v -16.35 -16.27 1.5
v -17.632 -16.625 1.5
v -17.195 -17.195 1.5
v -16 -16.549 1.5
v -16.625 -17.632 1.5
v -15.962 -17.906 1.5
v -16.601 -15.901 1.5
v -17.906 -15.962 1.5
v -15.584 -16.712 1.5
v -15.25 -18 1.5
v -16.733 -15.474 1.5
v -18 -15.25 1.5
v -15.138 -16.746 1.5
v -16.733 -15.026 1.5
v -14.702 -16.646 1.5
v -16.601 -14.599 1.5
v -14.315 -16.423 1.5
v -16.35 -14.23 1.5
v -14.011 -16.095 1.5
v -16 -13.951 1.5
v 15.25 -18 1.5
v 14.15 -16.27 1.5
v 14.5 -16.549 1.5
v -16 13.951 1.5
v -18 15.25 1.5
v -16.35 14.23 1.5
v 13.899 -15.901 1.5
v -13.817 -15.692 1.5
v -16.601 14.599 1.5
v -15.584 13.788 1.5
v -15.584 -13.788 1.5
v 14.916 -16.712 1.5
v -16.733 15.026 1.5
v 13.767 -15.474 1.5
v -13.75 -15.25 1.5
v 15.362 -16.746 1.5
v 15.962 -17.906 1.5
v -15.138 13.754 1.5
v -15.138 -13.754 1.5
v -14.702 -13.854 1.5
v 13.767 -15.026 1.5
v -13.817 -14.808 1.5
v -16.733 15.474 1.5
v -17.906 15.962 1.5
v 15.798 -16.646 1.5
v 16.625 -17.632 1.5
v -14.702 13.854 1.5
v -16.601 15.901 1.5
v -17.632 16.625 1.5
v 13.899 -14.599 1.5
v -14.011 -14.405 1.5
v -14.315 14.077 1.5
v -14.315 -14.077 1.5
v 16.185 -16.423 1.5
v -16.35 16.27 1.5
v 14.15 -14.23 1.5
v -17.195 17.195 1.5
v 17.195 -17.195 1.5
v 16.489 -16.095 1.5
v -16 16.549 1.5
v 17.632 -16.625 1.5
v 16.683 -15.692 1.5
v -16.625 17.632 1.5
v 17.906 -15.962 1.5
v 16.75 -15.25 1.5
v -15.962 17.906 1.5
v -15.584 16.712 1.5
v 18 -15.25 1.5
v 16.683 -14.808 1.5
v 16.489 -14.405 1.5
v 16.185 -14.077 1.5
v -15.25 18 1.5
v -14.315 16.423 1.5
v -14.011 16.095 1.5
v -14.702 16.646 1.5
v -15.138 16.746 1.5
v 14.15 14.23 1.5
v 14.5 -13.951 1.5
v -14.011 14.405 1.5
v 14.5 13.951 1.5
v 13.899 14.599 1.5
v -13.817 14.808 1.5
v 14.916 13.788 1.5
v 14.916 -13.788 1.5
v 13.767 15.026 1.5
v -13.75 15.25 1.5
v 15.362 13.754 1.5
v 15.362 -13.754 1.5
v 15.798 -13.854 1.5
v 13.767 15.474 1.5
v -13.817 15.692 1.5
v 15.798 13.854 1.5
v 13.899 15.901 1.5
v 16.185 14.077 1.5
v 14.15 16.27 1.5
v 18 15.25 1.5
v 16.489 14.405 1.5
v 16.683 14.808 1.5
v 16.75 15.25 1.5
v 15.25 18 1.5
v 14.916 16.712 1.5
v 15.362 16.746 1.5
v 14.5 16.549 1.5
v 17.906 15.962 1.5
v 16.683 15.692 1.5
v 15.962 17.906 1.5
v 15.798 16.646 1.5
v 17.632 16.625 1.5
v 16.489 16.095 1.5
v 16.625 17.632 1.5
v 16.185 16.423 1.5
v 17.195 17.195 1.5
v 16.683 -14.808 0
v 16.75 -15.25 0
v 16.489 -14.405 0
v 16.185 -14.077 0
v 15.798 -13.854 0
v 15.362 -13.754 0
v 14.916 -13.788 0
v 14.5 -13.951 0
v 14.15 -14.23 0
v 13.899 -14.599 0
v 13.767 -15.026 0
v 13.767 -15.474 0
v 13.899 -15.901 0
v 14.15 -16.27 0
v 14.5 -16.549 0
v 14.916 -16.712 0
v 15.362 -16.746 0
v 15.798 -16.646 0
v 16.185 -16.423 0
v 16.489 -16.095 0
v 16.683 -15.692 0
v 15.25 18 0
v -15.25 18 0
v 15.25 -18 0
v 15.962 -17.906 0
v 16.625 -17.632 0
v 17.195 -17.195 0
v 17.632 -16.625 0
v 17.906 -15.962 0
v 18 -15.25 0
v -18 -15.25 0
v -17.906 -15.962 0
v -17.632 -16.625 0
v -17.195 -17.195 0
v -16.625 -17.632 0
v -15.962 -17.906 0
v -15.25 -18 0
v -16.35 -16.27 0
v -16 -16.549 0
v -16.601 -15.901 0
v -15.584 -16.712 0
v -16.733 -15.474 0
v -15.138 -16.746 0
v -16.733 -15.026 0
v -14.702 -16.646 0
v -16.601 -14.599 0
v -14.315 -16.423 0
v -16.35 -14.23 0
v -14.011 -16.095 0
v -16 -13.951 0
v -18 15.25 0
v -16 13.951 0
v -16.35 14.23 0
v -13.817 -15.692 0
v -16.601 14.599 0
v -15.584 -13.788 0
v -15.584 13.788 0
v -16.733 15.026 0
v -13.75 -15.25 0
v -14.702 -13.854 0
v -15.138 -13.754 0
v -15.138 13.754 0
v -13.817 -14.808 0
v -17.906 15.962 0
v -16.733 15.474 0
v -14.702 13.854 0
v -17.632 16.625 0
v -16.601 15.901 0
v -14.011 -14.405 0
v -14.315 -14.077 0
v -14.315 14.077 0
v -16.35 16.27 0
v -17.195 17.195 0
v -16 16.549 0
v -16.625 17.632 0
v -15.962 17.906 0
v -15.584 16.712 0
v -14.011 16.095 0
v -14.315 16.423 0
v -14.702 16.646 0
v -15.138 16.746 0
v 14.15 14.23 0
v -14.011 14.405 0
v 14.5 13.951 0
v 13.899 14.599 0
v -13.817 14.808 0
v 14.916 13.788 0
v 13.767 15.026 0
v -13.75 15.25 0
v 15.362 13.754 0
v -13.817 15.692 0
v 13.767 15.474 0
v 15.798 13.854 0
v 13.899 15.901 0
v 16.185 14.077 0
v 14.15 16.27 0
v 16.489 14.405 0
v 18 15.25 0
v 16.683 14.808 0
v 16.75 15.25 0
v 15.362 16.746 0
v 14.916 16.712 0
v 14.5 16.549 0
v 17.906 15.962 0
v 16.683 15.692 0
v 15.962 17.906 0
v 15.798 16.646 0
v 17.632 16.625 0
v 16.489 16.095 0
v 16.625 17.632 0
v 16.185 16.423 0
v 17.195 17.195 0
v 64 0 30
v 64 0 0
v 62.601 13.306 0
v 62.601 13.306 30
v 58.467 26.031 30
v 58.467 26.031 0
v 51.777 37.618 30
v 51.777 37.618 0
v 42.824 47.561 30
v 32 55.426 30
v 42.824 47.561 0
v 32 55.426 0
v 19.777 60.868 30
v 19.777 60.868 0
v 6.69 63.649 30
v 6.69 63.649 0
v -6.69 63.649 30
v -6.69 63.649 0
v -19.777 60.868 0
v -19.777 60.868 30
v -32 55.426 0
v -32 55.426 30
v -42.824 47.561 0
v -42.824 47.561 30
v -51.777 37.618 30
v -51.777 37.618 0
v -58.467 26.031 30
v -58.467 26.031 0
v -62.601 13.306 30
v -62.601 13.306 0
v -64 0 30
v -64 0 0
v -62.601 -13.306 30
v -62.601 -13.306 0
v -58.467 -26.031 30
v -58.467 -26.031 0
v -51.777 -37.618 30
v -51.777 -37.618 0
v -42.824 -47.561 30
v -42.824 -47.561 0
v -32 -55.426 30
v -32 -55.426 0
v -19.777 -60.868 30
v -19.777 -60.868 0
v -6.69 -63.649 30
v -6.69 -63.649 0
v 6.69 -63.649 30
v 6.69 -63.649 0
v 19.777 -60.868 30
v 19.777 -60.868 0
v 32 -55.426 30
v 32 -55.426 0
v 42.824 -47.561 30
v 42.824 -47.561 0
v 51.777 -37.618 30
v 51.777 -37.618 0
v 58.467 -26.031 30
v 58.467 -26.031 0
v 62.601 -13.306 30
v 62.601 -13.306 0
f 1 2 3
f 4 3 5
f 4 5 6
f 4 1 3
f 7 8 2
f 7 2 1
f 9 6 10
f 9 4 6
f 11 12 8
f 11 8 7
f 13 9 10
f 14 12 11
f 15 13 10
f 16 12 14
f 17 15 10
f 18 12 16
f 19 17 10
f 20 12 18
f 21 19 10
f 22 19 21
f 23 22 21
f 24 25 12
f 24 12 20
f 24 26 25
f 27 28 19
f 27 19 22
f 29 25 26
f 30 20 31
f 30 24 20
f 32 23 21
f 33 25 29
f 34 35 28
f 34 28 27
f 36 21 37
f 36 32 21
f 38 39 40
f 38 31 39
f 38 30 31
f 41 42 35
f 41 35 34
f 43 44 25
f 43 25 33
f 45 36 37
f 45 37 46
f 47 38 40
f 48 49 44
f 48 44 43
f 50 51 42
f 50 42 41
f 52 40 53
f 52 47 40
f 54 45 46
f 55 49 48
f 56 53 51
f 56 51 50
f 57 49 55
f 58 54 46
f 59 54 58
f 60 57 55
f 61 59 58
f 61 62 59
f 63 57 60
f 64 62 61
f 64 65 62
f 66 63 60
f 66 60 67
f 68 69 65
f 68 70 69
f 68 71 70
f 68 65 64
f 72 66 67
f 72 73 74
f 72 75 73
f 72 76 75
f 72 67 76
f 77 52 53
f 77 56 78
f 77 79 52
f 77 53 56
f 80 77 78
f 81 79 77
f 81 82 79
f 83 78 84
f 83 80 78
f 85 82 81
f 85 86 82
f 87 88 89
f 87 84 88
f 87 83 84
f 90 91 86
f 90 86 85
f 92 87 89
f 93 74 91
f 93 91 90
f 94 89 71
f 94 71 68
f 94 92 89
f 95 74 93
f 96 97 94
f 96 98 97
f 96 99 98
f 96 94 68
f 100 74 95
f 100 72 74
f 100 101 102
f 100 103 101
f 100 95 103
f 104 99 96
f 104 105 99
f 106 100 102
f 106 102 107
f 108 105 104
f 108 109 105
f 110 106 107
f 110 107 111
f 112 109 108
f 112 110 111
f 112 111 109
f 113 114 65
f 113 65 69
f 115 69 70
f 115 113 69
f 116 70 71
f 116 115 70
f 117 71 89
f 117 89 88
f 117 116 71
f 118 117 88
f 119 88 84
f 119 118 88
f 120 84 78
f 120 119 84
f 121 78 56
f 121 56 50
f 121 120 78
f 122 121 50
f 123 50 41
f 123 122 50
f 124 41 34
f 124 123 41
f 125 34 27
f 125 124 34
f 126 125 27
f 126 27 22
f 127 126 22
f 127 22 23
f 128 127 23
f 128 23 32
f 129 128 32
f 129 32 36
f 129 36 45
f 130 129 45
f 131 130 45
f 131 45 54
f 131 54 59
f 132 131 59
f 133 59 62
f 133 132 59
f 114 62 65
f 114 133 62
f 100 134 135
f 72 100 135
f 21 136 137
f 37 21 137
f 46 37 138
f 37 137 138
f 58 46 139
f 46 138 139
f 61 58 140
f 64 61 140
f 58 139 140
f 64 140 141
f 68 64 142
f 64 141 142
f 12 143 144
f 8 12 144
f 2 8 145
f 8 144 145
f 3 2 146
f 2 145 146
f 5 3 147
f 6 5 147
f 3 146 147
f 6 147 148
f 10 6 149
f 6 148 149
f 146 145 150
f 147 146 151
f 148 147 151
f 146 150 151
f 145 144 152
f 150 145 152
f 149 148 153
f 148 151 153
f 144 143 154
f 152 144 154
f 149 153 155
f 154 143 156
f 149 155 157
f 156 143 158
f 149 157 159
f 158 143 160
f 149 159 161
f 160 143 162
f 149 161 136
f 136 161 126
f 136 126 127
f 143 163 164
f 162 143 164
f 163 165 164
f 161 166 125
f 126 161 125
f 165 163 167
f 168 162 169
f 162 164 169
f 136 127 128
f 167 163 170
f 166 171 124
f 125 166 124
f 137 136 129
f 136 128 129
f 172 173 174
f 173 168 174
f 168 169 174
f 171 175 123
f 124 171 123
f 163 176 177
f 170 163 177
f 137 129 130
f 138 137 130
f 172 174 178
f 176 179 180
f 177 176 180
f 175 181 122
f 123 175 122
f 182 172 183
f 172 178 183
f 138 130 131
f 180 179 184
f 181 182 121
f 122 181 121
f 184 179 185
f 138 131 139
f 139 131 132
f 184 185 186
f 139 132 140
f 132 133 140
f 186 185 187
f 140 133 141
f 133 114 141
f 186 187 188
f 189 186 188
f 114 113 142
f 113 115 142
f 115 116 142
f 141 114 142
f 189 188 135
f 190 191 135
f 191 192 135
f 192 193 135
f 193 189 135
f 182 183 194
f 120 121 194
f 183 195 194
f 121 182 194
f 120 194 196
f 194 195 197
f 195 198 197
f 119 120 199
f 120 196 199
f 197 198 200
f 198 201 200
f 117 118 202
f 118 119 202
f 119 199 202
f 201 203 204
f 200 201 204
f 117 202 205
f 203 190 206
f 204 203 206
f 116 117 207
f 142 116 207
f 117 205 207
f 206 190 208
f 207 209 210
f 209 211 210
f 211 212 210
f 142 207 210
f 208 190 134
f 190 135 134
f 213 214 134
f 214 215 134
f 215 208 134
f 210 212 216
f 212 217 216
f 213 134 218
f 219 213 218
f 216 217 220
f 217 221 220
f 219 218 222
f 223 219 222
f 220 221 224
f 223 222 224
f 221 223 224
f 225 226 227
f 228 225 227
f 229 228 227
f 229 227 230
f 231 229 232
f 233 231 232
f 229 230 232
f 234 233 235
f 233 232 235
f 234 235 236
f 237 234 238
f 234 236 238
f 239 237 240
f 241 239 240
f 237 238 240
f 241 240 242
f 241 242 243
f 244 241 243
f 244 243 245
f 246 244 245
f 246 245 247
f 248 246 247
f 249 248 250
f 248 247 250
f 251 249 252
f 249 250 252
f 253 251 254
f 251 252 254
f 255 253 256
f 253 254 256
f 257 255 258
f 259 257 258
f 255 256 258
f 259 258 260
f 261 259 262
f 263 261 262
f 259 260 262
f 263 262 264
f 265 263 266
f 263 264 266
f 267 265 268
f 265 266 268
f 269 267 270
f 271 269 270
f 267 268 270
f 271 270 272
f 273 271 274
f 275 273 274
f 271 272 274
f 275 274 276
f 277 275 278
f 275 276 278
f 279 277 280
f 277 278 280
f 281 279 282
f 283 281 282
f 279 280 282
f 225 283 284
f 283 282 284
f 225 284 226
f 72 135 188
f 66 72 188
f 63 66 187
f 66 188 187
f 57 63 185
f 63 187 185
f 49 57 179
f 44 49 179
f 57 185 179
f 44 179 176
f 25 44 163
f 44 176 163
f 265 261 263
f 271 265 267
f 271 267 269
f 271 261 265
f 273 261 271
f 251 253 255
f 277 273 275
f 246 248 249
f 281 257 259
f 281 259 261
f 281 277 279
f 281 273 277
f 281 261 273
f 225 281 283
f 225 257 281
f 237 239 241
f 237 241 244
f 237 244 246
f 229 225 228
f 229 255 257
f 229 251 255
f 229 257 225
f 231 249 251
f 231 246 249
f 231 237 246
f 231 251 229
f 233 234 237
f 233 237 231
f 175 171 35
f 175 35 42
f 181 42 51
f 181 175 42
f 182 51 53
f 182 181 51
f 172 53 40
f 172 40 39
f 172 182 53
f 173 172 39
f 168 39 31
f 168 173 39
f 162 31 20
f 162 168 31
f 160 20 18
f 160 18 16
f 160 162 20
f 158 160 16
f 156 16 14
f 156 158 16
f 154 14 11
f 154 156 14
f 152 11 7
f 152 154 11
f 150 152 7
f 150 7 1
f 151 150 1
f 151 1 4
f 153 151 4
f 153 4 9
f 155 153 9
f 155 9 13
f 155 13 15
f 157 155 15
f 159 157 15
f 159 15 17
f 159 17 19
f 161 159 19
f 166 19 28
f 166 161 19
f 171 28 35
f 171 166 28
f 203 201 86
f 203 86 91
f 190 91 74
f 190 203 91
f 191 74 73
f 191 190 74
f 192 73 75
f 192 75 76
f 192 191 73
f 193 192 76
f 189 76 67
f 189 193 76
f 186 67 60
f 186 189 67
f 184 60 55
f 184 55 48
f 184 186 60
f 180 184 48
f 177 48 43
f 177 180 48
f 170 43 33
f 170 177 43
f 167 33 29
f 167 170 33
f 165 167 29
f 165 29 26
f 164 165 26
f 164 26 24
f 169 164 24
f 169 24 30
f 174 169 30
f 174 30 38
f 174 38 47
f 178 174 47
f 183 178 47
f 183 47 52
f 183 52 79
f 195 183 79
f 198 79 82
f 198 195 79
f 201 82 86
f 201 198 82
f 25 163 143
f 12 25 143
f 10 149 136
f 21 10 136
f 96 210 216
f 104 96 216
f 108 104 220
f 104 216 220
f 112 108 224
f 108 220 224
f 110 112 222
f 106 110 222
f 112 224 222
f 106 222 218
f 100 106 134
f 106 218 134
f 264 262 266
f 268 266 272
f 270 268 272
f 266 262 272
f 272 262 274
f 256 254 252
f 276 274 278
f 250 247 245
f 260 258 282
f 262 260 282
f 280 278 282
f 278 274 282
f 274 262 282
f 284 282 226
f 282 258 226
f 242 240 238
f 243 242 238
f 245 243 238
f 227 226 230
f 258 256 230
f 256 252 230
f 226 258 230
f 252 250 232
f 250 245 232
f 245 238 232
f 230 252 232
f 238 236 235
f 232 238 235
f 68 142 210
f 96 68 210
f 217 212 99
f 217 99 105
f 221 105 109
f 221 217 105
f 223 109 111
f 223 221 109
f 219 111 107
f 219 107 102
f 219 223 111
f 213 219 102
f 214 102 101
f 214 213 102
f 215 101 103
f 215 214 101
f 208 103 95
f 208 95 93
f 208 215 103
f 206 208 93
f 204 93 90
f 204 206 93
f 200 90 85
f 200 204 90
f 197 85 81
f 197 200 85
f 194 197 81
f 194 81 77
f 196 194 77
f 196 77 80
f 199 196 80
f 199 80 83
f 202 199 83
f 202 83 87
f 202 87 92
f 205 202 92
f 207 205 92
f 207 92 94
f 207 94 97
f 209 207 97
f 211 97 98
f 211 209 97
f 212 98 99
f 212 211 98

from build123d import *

# Parameters (mm, degrees)
F0_R     = 1.5
F1_DEPTH = 1.5
F2_R     = 64
F3_DEPTH = 30


with BuildPart() as f1:
    # F0 (on Top) → F1 (new body)
    with BuildSketch(Plane.XY):
        with BuildLine():
            Line((0, 18), (-15.25, 18))
            ThreePointArc((-15.25, 18), (-17.194544, 17.194544), (-18, 15.25))
            Line((-18, 15.25), (-18, 0))
            Line((-18, 0), (-18, -15.25))
            ThreePointArc((-18, -15.25), (-17.194544, -17.194544), (-15.25, -18))
            Line((-15.25, -18), (0, -18))
            Line((0, -18), (15.25, -18))
            ThreePointArc((15.25, -18), (17.194544, -17.194544), (18, -15.25))
            Line((18, -15.25), (18, 0))
            Line((18, 0), (18, 15.25))
            ThreePointArc((18, 15.25), (17.194544, 17.194544), (15.25, 18))
            Line((15.25, 18), (0, 18))
        make_face()
        with Locations((-15.25, -15.25)):
            Circle(F0_R, mode=Mode.SUBTRACT)
        with Locations((15.25, -15.25)):
            Circle(F0_R, mode=Mode.SUBTRACT)
        with Locations((-15.25, 15.25)):
            Circle(F0_R, mode=Mode.SUBTRACT)
        with Locations((15.25, 15.25)):
            Circle(F0_R, mode=Mode.SUBTRACT)
    extrude(amount=F1_DEPTH)


with BuildPart() as f3:
    # F2 (on Top) → F3 (new body)
    with BuildSketch(Plane.XY):
        Circle(F2_R)
    extrude(amount=F3_DEPTH)


solid = Compound([f1.part, f3.part])
